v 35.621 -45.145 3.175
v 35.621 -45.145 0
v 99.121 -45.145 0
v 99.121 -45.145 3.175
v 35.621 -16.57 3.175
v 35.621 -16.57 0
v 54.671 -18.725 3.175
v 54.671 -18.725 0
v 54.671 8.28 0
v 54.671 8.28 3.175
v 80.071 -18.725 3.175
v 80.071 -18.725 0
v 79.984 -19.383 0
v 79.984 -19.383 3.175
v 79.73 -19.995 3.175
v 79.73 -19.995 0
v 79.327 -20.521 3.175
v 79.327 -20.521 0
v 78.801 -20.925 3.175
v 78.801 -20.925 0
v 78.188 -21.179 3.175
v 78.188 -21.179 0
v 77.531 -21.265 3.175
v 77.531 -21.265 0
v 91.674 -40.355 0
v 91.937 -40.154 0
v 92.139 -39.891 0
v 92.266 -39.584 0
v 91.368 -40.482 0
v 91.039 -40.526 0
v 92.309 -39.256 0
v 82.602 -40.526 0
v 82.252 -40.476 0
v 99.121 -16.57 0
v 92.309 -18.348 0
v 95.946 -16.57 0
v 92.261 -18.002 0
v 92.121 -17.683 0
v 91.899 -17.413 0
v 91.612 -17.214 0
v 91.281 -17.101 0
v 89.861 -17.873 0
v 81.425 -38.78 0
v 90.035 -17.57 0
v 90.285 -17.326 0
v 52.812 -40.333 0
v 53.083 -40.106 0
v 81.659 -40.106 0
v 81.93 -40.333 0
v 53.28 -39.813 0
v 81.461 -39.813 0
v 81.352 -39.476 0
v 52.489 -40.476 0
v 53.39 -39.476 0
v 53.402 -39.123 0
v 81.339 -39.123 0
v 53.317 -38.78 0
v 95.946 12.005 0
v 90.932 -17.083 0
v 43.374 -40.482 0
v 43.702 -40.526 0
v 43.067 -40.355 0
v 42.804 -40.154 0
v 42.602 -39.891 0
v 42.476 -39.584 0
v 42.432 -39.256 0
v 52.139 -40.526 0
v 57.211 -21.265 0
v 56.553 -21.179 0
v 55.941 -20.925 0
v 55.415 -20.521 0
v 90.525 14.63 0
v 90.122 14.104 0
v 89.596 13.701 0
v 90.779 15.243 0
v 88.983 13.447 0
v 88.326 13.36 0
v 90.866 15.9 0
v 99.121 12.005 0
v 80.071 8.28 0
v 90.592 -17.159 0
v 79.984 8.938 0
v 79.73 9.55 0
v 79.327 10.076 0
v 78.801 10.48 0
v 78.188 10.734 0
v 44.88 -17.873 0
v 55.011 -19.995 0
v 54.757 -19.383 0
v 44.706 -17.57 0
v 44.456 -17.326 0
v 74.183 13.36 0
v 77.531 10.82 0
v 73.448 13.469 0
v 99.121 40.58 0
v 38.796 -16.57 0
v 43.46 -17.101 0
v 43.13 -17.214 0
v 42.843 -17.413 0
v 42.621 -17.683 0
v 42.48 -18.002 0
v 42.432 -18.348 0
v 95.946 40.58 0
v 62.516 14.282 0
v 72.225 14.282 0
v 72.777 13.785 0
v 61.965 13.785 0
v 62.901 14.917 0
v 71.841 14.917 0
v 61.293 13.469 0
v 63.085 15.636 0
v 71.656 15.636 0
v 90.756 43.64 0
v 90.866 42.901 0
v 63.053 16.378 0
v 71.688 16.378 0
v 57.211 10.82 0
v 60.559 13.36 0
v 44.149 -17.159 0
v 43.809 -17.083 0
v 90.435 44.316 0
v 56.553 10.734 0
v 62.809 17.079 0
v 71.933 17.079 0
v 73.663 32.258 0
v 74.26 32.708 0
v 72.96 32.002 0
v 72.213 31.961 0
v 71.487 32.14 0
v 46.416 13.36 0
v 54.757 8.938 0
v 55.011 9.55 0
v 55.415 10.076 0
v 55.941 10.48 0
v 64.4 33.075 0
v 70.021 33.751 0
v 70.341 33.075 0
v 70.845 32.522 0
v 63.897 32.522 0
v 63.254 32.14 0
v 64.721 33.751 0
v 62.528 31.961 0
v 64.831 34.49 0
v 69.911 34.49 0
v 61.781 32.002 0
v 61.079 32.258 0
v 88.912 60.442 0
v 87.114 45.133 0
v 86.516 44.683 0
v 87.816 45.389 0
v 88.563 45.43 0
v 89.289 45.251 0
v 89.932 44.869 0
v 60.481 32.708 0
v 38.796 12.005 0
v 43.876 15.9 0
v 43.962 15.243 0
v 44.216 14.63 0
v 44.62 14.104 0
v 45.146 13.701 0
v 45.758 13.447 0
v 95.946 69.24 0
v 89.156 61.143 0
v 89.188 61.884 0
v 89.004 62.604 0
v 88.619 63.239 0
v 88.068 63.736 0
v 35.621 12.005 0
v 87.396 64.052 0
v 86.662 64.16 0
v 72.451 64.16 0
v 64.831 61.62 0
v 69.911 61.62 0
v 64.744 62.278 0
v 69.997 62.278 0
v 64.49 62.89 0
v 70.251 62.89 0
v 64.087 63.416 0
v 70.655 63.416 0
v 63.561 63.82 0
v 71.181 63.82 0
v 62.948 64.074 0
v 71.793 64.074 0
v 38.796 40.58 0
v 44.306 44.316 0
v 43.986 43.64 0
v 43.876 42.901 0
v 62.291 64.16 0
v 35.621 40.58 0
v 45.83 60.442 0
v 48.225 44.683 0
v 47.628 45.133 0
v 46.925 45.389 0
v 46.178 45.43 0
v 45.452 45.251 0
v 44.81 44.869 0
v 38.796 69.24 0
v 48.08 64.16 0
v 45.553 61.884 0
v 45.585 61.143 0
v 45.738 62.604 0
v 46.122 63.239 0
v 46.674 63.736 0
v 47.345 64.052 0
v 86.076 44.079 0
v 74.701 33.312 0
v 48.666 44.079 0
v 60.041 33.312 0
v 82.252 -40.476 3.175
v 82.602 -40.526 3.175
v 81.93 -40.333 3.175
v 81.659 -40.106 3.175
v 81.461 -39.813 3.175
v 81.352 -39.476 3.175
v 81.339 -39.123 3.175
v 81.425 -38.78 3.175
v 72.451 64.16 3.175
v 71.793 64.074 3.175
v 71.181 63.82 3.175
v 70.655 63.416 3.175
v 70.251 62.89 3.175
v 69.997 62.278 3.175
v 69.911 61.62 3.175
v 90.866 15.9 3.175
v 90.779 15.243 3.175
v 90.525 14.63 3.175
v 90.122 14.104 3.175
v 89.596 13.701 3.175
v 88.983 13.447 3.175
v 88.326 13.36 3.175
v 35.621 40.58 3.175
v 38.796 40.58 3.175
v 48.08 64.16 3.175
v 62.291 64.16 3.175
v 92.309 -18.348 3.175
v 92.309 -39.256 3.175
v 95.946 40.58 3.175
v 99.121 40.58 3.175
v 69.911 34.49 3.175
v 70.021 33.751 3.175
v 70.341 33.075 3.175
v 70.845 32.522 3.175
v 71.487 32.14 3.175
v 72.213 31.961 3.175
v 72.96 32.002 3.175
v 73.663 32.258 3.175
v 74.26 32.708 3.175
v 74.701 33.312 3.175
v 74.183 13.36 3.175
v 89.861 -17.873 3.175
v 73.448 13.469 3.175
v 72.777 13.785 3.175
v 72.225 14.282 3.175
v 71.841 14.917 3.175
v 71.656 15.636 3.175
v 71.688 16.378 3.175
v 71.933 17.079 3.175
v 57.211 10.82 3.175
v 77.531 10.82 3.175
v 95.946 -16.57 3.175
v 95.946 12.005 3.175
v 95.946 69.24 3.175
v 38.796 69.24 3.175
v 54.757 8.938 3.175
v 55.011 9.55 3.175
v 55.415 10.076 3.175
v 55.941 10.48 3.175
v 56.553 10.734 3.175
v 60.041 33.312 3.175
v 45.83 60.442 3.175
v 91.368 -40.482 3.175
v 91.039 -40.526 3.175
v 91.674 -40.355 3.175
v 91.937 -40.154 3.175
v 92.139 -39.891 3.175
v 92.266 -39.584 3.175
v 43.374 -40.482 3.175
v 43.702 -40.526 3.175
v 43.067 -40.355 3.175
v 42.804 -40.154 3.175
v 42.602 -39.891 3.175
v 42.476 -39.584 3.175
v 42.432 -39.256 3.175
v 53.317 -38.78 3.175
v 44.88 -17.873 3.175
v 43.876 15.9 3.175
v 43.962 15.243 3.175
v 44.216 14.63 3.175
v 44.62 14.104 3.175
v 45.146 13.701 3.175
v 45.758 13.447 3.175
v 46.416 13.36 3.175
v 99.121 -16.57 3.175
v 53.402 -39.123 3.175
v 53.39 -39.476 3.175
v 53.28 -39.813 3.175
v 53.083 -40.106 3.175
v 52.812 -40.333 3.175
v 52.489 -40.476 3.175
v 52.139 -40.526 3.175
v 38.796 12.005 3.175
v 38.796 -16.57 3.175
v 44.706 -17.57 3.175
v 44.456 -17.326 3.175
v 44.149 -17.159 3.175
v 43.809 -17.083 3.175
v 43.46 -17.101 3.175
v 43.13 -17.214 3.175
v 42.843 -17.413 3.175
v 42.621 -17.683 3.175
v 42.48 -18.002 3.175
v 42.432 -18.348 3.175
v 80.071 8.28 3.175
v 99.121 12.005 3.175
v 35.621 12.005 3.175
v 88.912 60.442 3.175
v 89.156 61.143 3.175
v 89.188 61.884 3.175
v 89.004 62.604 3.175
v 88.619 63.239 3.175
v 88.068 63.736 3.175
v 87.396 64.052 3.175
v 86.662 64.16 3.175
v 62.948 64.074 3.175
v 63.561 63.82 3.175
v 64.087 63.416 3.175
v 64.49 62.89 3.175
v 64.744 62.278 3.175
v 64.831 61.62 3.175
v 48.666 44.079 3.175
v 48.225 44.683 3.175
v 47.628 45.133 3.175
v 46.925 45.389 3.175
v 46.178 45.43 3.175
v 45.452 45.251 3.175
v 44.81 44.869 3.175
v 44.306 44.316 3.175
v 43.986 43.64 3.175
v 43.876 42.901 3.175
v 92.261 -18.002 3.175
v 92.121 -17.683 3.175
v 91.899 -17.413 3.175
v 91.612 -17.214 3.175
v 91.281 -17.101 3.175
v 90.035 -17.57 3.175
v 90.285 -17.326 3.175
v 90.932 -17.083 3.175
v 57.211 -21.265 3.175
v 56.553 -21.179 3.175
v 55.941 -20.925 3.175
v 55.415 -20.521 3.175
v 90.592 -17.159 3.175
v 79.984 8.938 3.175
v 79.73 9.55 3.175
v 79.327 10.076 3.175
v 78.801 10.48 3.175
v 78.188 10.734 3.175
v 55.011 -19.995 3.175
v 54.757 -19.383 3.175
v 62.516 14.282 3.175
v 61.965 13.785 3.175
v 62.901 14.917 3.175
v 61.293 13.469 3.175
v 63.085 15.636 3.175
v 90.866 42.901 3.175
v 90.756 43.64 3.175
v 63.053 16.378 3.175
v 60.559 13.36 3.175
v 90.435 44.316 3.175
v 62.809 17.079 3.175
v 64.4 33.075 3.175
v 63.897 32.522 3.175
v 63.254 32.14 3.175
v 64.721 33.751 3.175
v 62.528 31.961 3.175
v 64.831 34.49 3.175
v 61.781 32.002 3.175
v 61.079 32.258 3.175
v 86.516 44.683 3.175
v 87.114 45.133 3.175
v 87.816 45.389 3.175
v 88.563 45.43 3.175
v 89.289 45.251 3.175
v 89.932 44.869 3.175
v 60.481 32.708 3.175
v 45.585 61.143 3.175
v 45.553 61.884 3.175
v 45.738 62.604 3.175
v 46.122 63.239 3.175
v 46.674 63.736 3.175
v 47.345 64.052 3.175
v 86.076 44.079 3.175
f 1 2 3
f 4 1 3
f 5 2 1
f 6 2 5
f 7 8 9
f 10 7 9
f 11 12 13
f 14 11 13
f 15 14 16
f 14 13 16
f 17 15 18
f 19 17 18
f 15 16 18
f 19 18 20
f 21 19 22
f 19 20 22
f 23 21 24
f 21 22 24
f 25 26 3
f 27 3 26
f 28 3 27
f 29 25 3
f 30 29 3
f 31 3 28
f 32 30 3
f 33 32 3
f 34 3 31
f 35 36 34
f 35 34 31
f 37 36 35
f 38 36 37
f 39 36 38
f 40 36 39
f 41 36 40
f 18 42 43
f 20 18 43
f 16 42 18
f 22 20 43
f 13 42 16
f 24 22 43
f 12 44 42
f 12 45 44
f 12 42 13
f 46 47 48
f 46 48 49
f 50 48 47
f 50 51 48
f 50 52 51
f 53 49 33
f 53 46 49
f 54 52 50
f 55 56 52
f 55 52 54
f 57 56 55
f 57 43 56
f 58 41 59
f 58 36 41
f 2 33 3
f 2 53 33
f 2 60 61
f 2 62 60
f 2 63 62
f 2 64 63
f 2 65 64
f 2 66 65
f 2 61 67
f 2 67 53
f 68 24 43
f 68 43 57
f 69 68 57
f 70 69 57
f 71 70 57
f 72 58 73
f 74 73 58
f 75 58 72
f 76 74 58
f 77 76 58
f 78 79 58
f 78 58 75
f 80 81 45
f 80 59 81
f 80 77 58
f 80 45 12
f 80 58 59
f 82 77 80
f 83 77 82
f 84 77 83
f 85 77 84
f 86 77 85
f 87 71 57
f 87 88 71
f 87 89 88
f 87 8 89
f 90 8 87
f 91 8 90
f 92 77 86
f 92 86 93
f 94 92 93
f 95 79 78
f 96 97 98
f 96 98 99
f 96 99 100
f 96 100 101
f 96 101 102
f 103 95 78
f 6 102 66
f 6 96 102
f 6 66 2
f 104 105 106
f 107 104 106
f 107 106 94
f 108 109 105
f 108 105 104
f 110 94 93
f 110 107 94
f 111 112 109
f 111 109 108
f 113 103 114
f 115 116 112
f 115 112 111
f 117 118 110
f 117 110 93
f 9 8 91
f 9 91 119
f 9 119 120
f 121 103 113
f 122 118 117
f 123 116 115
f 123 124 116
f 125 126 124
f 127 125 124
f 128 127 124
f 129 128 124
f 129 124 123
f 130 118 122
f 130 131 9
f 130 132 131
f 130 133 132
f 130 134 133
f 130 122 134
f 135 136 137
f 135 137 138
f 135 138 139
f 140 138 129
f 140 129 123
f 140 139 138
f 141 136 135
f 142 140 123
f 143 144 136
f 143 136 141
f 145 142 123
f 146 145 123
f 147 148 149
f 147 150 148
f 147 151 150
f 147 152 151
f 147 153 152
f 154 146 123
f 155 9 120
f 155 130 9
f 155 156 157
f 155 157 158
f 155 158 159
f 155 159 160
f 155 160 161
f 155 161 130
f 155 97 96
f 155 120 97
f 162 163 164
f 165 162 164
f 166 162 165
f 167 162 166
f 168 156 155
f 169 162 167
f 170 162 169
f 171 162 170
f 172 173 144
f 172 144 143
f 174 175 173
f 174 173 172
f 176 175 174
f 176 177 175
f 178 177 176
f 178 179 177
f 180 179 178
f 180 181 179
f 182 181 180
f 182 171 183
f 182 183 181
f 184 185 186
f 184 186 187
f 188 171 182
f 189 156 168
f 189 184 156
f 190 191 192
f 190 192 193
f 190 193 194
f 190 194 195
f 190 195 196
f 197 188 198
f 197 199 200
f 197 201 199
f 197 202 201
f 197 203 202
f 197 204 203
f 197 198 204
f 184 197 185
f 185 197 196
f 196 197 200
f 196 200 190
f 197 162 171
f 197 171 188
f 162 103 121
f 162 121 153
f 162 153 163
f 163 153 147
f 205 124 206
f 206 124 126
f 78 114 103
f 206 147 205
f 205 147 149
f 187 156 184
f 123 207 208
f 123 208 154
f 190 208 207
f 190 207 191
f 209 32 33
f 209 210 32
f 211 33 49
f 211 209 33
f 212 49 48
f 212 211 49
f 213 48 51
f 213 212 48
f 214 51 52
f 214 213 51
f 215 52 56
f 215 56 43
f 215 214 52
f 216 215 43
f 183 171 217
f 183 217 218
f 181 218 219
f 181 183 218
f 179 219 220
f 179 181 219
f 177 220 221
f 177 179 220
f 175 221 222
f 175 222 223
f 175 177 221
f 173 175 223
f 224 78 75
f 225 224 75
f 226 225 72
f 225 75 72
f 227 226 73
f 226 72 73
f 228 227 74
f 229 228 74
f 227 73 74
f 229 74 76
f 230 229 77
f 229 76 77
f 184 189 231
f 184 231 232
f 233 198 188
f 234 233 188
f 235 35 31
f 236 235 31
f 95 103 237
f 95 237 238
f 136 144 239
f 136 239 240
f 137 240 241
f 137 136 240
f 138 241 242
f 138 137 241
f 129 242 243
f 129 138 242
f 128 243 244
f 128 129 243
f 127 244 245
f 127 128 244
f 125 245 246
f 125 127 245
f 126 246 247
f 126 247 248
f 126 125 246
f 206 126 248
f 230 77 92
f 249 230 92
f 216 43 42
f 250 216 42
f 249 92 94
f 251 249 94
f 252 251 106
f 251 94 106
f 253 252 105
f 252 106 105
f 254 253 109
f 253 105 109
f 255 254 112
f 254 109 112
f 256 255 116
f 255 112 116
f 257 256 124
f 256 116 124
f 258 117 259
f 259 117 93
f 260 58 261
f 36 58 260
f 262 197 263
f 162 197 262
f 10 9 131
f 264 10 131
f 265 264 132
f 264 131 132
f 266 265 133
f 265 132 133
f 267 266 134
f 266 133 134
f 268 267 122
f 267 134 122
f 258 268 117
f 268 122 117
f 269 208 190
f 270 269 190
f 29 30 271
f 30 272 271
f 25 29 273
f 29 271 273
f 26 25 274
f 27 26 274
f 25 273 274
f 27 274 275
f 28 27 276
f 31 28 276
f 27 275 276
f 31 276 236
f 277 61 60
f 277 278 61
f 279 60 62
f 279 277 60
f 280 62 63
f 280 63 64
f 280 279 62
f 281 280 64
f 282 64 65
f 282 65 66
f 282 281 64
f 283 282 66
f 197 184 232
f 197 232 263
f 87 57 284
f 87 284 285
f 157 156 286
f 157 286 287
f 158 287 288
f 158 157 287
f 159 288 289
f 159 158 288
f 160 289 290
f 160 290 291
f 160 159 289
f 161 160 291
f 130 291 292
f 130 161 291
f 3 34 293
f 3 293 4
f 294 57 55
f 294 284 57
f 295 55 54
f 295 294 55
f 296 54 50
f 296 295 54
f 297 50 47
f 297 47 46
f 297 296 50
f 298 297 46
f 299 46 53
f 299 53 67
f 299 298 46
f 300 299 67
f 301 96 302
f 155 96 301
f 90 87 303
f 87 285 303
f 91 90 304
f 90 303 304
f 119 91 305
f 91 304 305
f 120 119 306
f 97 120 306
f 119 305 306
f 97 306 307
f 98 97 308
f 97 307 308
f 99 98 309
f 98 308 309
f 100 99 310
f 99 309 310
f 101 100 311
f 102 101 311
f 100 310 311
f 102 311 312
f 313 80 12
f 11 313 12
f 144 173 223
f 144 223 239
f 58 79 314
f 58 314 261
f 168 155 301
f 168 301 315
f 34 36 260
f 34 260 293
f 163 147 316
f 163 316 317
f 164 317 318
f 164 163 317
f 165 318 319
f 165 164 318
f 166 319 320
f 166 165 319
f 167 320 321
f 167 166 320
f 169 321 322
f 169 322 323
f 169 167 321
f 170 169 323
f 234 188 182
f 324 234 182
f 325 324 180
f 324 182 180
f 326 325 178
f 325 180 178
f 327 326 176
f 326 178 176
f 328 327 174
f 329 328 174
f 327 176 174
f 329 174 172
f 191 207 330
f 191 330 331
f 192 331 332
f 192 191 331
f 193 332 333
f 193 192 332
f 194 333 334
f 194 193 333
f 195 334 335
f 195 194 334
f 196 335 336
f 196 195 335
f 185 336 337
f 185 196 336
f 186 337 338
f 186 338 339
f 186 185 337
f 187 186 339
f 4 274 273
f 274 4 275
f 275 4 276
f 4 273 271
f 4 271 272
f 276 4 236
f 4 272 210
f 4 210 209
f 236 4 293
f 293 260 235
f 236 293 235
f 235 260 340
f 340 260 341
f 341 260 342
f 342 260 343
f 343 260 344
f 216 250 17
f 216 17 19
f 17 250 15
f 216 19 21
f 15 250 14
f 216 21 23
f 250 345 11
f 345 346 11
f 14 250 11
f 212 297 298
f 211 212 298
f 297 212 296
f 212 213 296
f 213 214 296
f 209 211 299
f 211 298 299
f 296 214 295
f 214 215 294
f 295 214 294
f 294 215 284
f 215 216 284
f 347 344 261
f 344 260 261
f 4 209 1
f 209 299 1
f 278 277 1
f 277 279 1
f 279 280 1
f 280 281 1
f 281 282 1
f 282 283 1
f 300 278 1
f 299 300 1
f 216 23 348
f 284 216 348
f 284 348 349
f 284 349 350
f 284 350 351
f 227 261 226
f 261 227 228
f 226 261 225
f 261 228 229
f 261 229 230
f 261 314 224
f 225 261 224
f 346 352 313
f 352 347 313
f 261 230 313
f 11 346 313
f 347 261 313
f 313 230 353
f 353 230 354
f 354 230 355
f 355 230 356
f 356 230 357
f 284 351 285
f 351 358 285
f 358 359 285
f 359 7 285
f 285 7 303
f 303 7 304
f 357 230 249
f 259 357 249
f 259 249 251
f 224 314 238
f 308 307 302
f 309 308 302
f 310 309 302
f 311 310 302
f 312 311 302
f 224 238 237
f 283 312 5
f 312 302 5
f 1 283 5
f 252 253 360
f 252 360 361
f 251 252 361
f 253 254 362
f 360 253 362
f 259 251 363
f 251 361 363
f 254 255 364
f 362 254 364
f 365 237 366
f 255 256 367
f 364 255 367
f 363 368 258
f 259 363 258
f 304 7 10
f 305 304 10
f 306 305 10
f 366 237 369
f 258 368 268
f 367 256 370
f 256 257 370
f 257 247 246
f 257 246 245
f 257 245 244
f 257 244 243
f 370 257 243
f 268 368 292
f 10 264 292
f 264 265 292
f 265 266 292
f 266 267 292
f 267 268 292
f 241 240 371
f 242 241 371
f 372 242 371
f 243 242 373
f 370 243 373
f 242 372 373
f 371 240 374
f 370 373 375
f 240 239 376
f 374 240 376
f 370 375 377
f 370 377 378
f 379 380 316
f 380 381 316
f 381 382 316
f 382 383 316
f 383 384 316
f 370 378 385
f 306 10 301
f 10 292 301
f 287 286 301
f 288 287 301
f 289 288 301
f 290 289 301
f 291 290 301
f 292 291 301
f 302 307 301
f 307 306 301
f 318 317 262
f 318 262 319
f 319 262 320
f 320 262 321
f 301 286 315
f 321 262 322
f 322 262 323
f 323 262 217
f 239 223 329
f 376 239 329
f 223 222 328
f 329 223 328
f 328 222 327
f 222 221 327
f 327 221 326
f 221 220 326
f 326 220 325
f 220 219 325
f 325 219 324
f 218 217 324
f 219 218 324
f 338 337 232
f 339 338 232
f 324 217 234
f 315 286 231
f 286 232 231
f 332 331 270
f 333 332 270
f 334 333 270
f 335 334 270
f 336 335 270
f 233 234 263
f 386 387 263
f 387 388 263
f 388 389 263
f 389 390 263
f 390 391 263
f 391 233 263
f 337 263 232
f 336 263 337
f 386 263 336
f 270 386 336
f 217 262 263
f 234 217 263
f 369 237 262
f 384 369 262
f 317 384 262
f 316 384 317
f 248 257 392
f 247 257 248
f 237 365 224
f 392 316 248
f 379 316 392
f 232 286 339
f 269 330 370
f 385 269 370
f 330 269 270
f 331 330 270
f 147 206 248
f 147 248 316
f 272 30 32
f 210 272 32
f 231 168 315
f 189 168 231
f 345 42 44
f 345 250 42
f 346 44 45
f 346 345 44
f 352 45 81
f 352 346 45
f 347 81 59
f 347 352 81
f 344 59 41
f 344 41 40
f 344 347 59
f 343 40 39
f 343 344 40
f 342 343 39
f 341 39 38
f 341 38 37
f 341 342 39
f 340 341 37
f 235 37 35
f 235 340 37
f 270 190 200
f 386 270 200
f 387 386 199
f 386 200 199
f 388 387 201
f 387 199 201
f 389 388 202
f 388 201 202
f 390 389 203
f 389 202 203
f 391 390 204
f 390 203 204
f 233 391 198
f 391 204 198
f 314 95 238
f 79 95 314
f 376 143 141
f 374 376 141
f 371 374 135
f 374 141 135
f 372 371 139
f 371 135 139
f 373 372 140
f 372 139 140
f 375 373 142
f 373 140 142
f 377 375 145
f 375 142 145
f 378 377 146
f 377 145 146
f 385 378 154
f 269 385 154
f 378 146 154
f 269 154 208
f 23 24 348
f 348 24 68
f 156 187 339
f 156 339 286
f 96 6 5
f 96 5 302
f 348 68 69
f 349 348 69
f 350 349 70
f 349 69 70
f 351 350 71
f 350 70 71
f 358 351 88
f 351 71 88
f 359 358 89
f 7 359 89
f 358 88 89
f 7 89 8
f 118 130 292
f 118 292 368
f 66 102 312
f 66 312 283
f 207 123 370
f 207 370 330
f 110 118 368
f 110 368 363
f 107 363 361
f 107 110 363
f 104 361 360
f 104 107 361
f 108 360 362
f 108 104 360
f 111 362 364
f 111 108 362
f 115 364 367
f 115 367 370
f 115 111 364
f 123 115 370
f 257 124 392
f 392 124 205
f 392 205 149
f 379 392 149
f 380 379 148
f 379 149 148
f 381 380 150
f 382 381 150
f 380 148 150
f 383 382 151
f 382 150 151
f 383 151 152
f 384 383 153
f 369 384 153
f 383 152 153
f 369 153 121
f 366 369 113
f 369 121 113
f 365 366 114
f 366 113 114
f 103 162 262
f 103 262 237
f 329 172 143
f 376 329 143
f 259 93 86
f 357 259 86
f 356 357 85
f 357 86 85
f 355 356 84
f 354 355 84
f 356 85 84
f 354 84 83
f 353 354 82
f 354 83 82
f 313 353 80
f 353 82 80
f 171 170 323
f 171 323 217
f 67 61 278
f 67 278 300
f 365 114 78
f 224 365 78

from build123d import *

# Parameters (mm, degrees)
BOSS_EXTRUDE1_DEPTH = 3.175
FILLET1_R           = 1.27


with BuildPart() as part:
    # Sketch1 → Boss-Extrude1 (new body)
    with BuildSketch(Plane.XY):
        Polygon((35.620689733, 40.579771036), (38.795689733, 40.579771036), (38.795689733, 69.2403508), (95.945689733, 69.2403508), (95.945689733, 40.579771036), (99.120689733, 40.579771036), (99.120689733, 12.004771036), (95.945689733, 12.004771036), (95.945689733, -16.570228964), (99.120689733, -16.570228964), (99.120689733, -45.145228964), (95.945689733, -45.145228964), (38.795689733, -45.145228964), (35.620689733, -45.145228964), (35.620689733, -16.570228964), (38.795689733, -16.570228964), (38.795689733, 12.004771036), (35.620689733, 12.004771036), align=None)
        with BuildLine():
            Line((48.079687467, 64.1603508), (62.290689733, 64.1603508))
            ThreePointArc((62.290689733, 64.1603508), (64.086740957, 63.416402024), (64.830689733, 61.6203508))
            Line((64.830689733, 61.6203508), (64.830689733, 34.490159477))
            ThreePointArc((64.830689733, 34.490159477), (62.89755253, 32.023721246), (60.040675918, 33.311584986))
            Line((60.040675918, 33.311584986), (45.829673652, 60.441776309))
            ThreePointArc((45.829673652, 60.441776309), (45.90653547, 62.935269199), (48.079687467, 64.1603508))
        make_face(mode=Mode.SUBTRACT)
        with BuildLine():
            Line((69.910689733, 61.6203508), (69.910689733, 34.490159477))
            ThreePointArc((69.910689733, 34.490159477), (71.843826936, 32.023721246), (74.700703548, 33.311584986))
            Line((74.700703548, 33.311584986), (88.911705815, 60.441776309))
            ThreePointArc((88.911705815, 60.441776309), (88.834843997, 62.935269199), (86.661691999, 64.1603508))
            Line((86.661691999, 64.1603508), (72.450689733, 64.1603508))
            ThreePointArc((72.450689733, 64.1603508), (70.654638509, 63.416402024), (69.910689733, 61.6203508))
        make_face(mode=Mode.SUBTRACT)
        with BuildLine():
            Line((43.875689733, 42.900802499), (43.875689733, 15.9003508))
            ThreePointArc((43.875689733, 15.9003508), (44.619638509, 14.104299576), (46.415689733, 13.3603508))
            Line((46.415689733, 13.3603508), (60.558733389, 13.3603508))
            ThreePointArc((60.558733389, 13.3603508), (62.731885387, 14.585432401), (62.808747205, 17.078925291))
            Line((62.808747205, 17.078925291), (48.665703548, 44.07937699))
            ThreePointArc((48.665703548, 44.07937699), (45.808826936, 45.36724073), (43.875689733, 42.900802499))
        make_face(mode=Mode.SUBTRACT)
        with BuildLine():
            Line((71.932632262, 17.078925291), (86.075675918, 44.07937699))
            ThreePointArc((86.075675918, 44.07937699), (88.93255253, 45.36724073), (90.865689733, 42.900802499))
            Line((90.865689733, 42.900802499), (90.865689733, 15.9003508))
            ThreePointArc((90.865689733, 15.9003508), (90.121740957, 14.104299576), (88.325689733, 13.3603508))
            Line((88.325689733, 13.3603508), (74.182646077, 13.3603508))
            ThreePointArc((74.182646077, 13.3603508), (72.00949408, 14.585432401), (71.932632262, 17.078925291))
        make_face(mode=Mode.SUBTRACT)
        with BuildLine():
            Line((57.210689733, 10.8203508), (77.530689733, 10.8203508))
            ThreePointArc((77.530689733, 10.8203508), (79.326740957, 10.076402024), (80.070689733, 8.2803508))
            Line((80.070689733, 8.2803508), (80.070689733, -18.725228972))
            ThreePointArc((80.070689733, -18.725228972), (79.326740957, -20.521280196), (77.530689733, -21.265228972))
            Line((77.530689733, -21.265228972), (57.210689733, -21.265228972))
            ThreePointArc((57.210689733, -21.265228972), (55.414638509, -20.521280196), (54.670689733, -18.725228972))
            Line((54.670689733, -18.725228972), (54.670689733, 8.2803508))
            ThreePointArc((54.670689733, 8.2803508), (55.414638509, 10.076402024), (57.210689733, 10.8203508))
        make_face(mode=Mode.SUBTRACT)
        Polygon((42.432285336, -11.806981605), (42.432285336, -40.525537031), (54.020897102, -40.525537031), align=None, mode=Mode.SUBTRACT)
        Polygon((92.30909413, -40.525537031), (80.720482364, -40.525537031), (92.30909413, -11.806981605), align=None, mode=Mode.SUBTRACT)
    extrude(amount=BOSS_EXTRUDE1_DEPTH)

    # Fillet1
    fillet1_edges = [part.edges().sort_by_distance(p)[0] for p in [
        (54.020897102, -40.525537031, 1.5875),
        (42.432285336, -11.806981605, 1.5875),
        (42.432285336, -40.525537031, 1.5875),
        (92.30909413, -40.525537031, 1.5875),
        (92.30909413, -11.806981605, 1.5875),
        (80.720482364, -40.525537031, 1.5875),
    ]]
    fillet(fillet1_edges, radius=FILLET1_R)


solid = part.part
